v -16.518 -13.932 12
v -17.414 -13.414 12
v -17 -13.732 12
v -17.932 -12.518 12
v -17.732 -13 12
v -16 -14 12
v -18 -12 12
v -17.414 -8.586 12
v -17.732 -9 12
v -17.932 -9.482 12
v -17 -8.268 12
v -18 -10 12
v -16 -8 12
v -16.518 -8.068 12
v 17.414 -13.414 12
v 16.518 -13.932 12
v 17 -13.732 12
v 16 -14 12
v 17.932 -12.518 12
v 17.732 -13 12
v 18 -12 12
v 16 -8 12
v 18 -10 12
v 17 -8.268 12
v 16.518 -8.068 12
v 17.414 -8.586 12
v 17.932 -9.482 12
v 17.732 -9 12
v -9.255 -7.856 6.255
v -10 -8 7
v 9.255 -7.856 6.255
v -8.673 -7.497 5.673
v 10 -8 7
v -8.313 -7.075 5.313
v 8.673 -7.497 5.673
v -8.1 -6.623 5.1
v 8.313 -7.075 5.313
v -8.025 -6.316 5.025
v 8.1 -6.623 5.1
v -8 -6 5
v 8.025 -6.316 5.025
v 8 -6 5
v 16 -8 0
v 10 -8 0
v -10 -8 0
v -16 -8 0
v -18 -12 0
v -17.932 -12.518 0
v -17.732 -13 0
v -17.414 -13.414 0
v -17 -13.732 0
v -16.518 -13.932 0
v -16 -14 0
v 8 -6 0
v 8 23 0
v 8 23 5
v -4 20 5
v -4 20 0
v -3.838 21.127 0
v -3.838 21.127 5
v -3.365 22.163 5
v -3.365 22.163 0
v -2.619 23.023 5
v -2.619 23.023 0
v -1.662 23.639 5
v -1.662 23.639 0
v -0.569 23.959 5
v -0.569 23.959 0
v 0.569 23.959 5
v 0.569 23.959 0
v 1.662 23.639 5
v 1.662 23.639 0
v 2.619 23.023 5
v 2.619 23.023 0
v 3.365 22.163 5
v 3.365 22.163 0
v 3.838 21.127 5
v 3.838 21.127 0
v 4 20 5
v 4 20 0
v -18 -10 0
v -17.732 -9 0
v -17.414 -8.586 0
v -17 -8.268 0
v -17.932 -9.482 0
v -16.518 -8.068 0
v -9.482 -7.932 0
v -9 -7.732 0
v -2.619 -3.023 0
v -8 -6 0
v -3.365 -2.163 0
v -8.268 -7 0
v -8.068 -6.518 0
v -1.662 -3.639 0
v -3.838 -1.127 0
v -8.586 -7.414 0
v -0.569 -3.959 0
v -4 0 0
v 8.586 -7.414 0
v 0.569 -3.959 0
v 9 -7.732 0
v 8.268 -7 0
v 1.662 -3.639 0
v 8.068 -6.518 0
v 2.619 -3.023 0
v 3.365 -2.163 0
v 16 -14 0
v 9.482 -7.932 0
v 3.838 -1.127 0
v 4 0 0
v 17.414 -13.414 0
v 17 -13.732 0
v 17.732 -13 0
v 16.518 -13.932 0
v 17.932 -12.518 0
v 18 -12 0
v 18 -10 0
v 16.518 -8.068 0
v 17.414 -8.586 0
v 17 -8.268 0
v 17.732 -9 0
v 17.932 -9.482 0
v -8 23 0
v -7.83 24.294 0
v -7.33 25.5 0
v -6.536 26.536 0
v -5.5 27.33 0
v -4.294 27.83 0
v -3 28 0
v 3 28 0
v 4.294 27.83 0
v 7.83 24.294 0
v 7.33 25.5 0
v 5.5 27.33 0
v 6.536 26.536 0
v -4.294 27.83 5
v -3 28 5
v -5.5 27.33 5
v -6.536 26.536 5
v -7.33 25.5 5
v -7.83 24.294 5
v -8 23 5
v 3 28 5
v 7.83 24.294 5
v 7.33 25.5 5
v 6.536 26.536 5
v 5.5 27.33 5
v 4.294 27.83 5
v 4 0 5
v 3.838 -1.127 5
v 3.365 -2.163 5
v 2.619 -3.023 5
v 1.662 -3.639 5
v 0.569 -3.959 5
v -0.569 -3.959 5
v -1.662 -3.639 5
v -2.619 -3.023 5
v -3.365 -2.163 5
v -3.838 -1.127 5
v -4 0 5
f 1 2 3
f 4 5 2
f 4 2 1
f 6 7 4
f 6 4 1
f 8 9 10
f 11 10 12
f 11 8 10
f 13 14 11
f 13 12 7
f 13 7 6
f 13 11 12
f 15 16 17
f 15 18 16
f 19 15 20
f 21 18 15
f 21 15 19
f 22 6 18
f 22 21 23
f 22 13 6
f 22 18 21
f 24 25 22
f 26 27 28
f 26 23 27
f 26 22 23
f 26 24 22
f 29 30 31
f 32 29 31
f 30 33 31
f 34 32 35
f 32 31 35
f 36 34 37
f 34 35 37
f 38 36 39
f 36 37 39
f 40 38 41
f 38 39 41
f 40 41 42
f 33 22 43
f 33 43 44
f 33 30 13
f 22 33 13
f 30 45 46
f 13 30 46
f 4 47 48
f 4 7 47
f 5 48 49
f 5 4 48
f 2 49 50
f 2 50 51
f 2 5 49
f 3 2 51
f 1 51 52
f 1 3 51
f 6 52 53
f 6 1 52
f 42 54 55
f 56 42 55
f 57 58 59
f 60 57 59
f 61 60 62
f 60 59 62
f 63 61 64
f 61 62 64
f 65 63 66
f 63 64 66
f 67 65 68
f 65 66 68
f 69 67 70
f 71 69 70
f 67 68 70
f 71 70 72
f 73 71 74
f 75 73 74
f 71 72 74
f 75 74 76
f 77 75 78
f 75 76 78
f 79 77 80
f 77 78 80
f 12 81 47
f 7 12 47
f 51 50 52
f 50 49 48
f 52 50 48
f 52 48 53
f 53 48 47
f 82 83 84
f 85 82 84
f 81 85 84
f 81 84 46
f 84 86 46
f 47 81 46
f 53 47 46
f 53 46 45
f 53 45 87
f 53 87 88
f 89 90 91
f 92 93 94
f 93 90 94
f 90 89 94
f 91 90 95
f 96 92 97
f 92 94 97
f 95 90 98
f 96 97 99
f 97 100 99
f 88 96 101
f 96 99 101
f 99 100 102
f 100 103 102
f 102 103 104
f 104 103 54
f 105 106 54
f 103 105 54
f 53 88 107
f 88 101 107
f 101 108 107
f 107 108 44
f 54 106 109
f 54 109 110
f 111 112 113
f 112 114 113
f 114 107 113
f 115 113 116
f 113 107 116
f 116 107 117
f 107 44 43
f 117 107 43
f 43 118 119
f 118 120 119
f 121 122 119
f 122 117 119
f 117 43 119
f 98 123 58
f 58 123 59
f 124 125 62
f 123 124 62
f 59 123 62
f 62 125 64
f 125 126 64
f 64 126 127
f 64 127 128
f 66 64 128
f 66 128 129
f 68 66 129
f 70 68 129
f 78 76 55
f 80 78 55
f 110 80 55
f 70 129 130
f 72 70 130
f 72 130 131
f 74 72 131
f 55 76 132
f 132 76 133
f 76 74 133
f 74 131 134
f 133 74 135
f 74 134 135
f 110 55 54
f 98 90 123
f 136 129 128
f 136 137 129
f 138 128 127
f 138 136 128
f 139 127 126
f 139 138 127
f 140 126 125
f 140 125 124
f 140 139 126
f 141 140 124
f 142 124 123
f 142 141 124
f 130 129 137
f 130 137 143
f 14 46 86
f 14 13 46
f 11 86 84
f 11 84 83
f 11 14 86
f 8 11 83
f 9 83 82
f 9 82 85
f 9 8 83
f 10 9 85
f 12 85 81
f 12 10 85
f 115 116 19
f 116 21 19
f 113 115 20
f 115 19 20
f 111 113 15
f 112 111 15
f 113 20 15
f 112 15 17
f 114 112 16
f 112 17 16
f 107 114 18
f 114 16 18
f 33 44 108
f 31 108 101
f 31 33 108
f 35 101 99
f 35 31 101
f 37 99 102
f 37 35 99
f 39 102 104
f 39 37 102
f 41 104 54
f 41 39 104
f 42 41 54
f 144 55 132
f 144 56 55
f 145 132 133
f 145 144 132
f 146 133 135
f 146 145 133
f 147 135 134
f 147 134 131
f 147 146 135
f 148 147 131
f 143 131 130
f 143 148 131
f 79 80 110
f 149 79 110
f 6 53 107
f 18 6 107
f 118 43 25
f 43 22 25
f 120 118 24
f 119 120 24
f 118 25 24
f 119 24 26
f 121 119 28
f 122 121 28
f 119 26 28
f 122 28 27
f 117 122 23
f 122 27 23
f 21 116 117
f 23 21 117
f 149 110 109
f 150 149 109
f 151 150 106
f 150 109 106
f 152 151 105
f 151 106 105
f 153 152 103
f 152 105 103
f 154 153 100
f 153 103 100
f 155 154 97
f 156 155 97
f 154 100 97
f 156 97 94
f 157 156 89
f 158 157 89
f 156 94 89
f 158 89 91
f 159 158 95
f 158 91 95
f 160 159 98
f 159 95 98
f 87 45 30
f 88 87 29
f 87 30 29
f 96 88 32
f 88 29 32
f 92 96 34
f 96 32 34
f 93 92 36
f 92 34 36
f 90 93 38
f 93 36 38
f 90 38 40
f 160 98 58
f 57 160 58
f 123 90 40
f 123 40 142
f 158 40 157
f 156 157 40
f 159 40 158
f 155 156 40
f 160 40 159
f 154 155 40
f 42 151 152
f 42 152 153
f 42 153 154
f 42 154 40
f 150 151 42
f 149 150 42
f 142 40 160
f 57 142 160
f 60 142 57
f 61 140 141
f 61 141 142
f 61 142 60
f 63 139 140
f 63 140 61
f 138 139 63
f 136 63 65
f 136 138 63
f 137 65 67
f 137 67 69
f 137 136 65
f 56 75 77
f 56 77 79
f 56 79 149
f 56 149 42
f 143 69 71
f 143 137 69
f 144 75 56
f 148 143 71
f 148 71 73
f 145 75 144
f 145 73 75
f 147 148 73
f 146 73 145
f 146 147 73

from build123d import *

# Parameters (mm, degrees)
F0_W     = 16
F0_H     = 36
F1_DEPTH = 5
F3_DEPTH = 12
F4_R     = 2
F5_R     = 5


with BuildPart() as f1:
    # F0 (on Top) → F1 (new body)
    with BuildSketch(Plane.XY):
        with Locations((0, 10)):
            Rectangle(F0_W, F0_H)
        with BuildLine():
            ThreePointArc((-4, 20), (0, 24), (4, 20))
            Line((4, 20), (4, 0))
            ThreePointArc((4, 0), (0, -4), (-4, 0))
            Line((-4, 0), (-4, 20))
        make_face(mode=Mode.SUBTRACT)
    extrude(amount=F1_DEPTH)

    # F2 (on Top) → F3 (join)
    with BuildSketch(Plane.XY):
        Polygon((18, -8), (0, -8), (-18, -8), (-18, -14), (18, -14), align=None)
    extrude(amount=F3_DEPTH)

    # F4
    f4_edges = [f1.edges().sort_by_distance(p)[0] for p in [
        (-18, -14, 6),
        (-18, -8, 6),
        (18, -8, 6),
        (18, -14, 6),
        (0, -8, 5),
        (8, -8, 2.5),
        (-8, -8, 2.5),
    ]]
    fillet(f4_edges, radius=F4_R)

    # F5
    f5_edges = [f1.edges().sort_by_distance(p)[0] for p in [
        (-8, 28, 2.5),
        (8, 28, 2.5),
    ]]
    fillet(f5_edges, radius=F5_R)


solid = f1.part
